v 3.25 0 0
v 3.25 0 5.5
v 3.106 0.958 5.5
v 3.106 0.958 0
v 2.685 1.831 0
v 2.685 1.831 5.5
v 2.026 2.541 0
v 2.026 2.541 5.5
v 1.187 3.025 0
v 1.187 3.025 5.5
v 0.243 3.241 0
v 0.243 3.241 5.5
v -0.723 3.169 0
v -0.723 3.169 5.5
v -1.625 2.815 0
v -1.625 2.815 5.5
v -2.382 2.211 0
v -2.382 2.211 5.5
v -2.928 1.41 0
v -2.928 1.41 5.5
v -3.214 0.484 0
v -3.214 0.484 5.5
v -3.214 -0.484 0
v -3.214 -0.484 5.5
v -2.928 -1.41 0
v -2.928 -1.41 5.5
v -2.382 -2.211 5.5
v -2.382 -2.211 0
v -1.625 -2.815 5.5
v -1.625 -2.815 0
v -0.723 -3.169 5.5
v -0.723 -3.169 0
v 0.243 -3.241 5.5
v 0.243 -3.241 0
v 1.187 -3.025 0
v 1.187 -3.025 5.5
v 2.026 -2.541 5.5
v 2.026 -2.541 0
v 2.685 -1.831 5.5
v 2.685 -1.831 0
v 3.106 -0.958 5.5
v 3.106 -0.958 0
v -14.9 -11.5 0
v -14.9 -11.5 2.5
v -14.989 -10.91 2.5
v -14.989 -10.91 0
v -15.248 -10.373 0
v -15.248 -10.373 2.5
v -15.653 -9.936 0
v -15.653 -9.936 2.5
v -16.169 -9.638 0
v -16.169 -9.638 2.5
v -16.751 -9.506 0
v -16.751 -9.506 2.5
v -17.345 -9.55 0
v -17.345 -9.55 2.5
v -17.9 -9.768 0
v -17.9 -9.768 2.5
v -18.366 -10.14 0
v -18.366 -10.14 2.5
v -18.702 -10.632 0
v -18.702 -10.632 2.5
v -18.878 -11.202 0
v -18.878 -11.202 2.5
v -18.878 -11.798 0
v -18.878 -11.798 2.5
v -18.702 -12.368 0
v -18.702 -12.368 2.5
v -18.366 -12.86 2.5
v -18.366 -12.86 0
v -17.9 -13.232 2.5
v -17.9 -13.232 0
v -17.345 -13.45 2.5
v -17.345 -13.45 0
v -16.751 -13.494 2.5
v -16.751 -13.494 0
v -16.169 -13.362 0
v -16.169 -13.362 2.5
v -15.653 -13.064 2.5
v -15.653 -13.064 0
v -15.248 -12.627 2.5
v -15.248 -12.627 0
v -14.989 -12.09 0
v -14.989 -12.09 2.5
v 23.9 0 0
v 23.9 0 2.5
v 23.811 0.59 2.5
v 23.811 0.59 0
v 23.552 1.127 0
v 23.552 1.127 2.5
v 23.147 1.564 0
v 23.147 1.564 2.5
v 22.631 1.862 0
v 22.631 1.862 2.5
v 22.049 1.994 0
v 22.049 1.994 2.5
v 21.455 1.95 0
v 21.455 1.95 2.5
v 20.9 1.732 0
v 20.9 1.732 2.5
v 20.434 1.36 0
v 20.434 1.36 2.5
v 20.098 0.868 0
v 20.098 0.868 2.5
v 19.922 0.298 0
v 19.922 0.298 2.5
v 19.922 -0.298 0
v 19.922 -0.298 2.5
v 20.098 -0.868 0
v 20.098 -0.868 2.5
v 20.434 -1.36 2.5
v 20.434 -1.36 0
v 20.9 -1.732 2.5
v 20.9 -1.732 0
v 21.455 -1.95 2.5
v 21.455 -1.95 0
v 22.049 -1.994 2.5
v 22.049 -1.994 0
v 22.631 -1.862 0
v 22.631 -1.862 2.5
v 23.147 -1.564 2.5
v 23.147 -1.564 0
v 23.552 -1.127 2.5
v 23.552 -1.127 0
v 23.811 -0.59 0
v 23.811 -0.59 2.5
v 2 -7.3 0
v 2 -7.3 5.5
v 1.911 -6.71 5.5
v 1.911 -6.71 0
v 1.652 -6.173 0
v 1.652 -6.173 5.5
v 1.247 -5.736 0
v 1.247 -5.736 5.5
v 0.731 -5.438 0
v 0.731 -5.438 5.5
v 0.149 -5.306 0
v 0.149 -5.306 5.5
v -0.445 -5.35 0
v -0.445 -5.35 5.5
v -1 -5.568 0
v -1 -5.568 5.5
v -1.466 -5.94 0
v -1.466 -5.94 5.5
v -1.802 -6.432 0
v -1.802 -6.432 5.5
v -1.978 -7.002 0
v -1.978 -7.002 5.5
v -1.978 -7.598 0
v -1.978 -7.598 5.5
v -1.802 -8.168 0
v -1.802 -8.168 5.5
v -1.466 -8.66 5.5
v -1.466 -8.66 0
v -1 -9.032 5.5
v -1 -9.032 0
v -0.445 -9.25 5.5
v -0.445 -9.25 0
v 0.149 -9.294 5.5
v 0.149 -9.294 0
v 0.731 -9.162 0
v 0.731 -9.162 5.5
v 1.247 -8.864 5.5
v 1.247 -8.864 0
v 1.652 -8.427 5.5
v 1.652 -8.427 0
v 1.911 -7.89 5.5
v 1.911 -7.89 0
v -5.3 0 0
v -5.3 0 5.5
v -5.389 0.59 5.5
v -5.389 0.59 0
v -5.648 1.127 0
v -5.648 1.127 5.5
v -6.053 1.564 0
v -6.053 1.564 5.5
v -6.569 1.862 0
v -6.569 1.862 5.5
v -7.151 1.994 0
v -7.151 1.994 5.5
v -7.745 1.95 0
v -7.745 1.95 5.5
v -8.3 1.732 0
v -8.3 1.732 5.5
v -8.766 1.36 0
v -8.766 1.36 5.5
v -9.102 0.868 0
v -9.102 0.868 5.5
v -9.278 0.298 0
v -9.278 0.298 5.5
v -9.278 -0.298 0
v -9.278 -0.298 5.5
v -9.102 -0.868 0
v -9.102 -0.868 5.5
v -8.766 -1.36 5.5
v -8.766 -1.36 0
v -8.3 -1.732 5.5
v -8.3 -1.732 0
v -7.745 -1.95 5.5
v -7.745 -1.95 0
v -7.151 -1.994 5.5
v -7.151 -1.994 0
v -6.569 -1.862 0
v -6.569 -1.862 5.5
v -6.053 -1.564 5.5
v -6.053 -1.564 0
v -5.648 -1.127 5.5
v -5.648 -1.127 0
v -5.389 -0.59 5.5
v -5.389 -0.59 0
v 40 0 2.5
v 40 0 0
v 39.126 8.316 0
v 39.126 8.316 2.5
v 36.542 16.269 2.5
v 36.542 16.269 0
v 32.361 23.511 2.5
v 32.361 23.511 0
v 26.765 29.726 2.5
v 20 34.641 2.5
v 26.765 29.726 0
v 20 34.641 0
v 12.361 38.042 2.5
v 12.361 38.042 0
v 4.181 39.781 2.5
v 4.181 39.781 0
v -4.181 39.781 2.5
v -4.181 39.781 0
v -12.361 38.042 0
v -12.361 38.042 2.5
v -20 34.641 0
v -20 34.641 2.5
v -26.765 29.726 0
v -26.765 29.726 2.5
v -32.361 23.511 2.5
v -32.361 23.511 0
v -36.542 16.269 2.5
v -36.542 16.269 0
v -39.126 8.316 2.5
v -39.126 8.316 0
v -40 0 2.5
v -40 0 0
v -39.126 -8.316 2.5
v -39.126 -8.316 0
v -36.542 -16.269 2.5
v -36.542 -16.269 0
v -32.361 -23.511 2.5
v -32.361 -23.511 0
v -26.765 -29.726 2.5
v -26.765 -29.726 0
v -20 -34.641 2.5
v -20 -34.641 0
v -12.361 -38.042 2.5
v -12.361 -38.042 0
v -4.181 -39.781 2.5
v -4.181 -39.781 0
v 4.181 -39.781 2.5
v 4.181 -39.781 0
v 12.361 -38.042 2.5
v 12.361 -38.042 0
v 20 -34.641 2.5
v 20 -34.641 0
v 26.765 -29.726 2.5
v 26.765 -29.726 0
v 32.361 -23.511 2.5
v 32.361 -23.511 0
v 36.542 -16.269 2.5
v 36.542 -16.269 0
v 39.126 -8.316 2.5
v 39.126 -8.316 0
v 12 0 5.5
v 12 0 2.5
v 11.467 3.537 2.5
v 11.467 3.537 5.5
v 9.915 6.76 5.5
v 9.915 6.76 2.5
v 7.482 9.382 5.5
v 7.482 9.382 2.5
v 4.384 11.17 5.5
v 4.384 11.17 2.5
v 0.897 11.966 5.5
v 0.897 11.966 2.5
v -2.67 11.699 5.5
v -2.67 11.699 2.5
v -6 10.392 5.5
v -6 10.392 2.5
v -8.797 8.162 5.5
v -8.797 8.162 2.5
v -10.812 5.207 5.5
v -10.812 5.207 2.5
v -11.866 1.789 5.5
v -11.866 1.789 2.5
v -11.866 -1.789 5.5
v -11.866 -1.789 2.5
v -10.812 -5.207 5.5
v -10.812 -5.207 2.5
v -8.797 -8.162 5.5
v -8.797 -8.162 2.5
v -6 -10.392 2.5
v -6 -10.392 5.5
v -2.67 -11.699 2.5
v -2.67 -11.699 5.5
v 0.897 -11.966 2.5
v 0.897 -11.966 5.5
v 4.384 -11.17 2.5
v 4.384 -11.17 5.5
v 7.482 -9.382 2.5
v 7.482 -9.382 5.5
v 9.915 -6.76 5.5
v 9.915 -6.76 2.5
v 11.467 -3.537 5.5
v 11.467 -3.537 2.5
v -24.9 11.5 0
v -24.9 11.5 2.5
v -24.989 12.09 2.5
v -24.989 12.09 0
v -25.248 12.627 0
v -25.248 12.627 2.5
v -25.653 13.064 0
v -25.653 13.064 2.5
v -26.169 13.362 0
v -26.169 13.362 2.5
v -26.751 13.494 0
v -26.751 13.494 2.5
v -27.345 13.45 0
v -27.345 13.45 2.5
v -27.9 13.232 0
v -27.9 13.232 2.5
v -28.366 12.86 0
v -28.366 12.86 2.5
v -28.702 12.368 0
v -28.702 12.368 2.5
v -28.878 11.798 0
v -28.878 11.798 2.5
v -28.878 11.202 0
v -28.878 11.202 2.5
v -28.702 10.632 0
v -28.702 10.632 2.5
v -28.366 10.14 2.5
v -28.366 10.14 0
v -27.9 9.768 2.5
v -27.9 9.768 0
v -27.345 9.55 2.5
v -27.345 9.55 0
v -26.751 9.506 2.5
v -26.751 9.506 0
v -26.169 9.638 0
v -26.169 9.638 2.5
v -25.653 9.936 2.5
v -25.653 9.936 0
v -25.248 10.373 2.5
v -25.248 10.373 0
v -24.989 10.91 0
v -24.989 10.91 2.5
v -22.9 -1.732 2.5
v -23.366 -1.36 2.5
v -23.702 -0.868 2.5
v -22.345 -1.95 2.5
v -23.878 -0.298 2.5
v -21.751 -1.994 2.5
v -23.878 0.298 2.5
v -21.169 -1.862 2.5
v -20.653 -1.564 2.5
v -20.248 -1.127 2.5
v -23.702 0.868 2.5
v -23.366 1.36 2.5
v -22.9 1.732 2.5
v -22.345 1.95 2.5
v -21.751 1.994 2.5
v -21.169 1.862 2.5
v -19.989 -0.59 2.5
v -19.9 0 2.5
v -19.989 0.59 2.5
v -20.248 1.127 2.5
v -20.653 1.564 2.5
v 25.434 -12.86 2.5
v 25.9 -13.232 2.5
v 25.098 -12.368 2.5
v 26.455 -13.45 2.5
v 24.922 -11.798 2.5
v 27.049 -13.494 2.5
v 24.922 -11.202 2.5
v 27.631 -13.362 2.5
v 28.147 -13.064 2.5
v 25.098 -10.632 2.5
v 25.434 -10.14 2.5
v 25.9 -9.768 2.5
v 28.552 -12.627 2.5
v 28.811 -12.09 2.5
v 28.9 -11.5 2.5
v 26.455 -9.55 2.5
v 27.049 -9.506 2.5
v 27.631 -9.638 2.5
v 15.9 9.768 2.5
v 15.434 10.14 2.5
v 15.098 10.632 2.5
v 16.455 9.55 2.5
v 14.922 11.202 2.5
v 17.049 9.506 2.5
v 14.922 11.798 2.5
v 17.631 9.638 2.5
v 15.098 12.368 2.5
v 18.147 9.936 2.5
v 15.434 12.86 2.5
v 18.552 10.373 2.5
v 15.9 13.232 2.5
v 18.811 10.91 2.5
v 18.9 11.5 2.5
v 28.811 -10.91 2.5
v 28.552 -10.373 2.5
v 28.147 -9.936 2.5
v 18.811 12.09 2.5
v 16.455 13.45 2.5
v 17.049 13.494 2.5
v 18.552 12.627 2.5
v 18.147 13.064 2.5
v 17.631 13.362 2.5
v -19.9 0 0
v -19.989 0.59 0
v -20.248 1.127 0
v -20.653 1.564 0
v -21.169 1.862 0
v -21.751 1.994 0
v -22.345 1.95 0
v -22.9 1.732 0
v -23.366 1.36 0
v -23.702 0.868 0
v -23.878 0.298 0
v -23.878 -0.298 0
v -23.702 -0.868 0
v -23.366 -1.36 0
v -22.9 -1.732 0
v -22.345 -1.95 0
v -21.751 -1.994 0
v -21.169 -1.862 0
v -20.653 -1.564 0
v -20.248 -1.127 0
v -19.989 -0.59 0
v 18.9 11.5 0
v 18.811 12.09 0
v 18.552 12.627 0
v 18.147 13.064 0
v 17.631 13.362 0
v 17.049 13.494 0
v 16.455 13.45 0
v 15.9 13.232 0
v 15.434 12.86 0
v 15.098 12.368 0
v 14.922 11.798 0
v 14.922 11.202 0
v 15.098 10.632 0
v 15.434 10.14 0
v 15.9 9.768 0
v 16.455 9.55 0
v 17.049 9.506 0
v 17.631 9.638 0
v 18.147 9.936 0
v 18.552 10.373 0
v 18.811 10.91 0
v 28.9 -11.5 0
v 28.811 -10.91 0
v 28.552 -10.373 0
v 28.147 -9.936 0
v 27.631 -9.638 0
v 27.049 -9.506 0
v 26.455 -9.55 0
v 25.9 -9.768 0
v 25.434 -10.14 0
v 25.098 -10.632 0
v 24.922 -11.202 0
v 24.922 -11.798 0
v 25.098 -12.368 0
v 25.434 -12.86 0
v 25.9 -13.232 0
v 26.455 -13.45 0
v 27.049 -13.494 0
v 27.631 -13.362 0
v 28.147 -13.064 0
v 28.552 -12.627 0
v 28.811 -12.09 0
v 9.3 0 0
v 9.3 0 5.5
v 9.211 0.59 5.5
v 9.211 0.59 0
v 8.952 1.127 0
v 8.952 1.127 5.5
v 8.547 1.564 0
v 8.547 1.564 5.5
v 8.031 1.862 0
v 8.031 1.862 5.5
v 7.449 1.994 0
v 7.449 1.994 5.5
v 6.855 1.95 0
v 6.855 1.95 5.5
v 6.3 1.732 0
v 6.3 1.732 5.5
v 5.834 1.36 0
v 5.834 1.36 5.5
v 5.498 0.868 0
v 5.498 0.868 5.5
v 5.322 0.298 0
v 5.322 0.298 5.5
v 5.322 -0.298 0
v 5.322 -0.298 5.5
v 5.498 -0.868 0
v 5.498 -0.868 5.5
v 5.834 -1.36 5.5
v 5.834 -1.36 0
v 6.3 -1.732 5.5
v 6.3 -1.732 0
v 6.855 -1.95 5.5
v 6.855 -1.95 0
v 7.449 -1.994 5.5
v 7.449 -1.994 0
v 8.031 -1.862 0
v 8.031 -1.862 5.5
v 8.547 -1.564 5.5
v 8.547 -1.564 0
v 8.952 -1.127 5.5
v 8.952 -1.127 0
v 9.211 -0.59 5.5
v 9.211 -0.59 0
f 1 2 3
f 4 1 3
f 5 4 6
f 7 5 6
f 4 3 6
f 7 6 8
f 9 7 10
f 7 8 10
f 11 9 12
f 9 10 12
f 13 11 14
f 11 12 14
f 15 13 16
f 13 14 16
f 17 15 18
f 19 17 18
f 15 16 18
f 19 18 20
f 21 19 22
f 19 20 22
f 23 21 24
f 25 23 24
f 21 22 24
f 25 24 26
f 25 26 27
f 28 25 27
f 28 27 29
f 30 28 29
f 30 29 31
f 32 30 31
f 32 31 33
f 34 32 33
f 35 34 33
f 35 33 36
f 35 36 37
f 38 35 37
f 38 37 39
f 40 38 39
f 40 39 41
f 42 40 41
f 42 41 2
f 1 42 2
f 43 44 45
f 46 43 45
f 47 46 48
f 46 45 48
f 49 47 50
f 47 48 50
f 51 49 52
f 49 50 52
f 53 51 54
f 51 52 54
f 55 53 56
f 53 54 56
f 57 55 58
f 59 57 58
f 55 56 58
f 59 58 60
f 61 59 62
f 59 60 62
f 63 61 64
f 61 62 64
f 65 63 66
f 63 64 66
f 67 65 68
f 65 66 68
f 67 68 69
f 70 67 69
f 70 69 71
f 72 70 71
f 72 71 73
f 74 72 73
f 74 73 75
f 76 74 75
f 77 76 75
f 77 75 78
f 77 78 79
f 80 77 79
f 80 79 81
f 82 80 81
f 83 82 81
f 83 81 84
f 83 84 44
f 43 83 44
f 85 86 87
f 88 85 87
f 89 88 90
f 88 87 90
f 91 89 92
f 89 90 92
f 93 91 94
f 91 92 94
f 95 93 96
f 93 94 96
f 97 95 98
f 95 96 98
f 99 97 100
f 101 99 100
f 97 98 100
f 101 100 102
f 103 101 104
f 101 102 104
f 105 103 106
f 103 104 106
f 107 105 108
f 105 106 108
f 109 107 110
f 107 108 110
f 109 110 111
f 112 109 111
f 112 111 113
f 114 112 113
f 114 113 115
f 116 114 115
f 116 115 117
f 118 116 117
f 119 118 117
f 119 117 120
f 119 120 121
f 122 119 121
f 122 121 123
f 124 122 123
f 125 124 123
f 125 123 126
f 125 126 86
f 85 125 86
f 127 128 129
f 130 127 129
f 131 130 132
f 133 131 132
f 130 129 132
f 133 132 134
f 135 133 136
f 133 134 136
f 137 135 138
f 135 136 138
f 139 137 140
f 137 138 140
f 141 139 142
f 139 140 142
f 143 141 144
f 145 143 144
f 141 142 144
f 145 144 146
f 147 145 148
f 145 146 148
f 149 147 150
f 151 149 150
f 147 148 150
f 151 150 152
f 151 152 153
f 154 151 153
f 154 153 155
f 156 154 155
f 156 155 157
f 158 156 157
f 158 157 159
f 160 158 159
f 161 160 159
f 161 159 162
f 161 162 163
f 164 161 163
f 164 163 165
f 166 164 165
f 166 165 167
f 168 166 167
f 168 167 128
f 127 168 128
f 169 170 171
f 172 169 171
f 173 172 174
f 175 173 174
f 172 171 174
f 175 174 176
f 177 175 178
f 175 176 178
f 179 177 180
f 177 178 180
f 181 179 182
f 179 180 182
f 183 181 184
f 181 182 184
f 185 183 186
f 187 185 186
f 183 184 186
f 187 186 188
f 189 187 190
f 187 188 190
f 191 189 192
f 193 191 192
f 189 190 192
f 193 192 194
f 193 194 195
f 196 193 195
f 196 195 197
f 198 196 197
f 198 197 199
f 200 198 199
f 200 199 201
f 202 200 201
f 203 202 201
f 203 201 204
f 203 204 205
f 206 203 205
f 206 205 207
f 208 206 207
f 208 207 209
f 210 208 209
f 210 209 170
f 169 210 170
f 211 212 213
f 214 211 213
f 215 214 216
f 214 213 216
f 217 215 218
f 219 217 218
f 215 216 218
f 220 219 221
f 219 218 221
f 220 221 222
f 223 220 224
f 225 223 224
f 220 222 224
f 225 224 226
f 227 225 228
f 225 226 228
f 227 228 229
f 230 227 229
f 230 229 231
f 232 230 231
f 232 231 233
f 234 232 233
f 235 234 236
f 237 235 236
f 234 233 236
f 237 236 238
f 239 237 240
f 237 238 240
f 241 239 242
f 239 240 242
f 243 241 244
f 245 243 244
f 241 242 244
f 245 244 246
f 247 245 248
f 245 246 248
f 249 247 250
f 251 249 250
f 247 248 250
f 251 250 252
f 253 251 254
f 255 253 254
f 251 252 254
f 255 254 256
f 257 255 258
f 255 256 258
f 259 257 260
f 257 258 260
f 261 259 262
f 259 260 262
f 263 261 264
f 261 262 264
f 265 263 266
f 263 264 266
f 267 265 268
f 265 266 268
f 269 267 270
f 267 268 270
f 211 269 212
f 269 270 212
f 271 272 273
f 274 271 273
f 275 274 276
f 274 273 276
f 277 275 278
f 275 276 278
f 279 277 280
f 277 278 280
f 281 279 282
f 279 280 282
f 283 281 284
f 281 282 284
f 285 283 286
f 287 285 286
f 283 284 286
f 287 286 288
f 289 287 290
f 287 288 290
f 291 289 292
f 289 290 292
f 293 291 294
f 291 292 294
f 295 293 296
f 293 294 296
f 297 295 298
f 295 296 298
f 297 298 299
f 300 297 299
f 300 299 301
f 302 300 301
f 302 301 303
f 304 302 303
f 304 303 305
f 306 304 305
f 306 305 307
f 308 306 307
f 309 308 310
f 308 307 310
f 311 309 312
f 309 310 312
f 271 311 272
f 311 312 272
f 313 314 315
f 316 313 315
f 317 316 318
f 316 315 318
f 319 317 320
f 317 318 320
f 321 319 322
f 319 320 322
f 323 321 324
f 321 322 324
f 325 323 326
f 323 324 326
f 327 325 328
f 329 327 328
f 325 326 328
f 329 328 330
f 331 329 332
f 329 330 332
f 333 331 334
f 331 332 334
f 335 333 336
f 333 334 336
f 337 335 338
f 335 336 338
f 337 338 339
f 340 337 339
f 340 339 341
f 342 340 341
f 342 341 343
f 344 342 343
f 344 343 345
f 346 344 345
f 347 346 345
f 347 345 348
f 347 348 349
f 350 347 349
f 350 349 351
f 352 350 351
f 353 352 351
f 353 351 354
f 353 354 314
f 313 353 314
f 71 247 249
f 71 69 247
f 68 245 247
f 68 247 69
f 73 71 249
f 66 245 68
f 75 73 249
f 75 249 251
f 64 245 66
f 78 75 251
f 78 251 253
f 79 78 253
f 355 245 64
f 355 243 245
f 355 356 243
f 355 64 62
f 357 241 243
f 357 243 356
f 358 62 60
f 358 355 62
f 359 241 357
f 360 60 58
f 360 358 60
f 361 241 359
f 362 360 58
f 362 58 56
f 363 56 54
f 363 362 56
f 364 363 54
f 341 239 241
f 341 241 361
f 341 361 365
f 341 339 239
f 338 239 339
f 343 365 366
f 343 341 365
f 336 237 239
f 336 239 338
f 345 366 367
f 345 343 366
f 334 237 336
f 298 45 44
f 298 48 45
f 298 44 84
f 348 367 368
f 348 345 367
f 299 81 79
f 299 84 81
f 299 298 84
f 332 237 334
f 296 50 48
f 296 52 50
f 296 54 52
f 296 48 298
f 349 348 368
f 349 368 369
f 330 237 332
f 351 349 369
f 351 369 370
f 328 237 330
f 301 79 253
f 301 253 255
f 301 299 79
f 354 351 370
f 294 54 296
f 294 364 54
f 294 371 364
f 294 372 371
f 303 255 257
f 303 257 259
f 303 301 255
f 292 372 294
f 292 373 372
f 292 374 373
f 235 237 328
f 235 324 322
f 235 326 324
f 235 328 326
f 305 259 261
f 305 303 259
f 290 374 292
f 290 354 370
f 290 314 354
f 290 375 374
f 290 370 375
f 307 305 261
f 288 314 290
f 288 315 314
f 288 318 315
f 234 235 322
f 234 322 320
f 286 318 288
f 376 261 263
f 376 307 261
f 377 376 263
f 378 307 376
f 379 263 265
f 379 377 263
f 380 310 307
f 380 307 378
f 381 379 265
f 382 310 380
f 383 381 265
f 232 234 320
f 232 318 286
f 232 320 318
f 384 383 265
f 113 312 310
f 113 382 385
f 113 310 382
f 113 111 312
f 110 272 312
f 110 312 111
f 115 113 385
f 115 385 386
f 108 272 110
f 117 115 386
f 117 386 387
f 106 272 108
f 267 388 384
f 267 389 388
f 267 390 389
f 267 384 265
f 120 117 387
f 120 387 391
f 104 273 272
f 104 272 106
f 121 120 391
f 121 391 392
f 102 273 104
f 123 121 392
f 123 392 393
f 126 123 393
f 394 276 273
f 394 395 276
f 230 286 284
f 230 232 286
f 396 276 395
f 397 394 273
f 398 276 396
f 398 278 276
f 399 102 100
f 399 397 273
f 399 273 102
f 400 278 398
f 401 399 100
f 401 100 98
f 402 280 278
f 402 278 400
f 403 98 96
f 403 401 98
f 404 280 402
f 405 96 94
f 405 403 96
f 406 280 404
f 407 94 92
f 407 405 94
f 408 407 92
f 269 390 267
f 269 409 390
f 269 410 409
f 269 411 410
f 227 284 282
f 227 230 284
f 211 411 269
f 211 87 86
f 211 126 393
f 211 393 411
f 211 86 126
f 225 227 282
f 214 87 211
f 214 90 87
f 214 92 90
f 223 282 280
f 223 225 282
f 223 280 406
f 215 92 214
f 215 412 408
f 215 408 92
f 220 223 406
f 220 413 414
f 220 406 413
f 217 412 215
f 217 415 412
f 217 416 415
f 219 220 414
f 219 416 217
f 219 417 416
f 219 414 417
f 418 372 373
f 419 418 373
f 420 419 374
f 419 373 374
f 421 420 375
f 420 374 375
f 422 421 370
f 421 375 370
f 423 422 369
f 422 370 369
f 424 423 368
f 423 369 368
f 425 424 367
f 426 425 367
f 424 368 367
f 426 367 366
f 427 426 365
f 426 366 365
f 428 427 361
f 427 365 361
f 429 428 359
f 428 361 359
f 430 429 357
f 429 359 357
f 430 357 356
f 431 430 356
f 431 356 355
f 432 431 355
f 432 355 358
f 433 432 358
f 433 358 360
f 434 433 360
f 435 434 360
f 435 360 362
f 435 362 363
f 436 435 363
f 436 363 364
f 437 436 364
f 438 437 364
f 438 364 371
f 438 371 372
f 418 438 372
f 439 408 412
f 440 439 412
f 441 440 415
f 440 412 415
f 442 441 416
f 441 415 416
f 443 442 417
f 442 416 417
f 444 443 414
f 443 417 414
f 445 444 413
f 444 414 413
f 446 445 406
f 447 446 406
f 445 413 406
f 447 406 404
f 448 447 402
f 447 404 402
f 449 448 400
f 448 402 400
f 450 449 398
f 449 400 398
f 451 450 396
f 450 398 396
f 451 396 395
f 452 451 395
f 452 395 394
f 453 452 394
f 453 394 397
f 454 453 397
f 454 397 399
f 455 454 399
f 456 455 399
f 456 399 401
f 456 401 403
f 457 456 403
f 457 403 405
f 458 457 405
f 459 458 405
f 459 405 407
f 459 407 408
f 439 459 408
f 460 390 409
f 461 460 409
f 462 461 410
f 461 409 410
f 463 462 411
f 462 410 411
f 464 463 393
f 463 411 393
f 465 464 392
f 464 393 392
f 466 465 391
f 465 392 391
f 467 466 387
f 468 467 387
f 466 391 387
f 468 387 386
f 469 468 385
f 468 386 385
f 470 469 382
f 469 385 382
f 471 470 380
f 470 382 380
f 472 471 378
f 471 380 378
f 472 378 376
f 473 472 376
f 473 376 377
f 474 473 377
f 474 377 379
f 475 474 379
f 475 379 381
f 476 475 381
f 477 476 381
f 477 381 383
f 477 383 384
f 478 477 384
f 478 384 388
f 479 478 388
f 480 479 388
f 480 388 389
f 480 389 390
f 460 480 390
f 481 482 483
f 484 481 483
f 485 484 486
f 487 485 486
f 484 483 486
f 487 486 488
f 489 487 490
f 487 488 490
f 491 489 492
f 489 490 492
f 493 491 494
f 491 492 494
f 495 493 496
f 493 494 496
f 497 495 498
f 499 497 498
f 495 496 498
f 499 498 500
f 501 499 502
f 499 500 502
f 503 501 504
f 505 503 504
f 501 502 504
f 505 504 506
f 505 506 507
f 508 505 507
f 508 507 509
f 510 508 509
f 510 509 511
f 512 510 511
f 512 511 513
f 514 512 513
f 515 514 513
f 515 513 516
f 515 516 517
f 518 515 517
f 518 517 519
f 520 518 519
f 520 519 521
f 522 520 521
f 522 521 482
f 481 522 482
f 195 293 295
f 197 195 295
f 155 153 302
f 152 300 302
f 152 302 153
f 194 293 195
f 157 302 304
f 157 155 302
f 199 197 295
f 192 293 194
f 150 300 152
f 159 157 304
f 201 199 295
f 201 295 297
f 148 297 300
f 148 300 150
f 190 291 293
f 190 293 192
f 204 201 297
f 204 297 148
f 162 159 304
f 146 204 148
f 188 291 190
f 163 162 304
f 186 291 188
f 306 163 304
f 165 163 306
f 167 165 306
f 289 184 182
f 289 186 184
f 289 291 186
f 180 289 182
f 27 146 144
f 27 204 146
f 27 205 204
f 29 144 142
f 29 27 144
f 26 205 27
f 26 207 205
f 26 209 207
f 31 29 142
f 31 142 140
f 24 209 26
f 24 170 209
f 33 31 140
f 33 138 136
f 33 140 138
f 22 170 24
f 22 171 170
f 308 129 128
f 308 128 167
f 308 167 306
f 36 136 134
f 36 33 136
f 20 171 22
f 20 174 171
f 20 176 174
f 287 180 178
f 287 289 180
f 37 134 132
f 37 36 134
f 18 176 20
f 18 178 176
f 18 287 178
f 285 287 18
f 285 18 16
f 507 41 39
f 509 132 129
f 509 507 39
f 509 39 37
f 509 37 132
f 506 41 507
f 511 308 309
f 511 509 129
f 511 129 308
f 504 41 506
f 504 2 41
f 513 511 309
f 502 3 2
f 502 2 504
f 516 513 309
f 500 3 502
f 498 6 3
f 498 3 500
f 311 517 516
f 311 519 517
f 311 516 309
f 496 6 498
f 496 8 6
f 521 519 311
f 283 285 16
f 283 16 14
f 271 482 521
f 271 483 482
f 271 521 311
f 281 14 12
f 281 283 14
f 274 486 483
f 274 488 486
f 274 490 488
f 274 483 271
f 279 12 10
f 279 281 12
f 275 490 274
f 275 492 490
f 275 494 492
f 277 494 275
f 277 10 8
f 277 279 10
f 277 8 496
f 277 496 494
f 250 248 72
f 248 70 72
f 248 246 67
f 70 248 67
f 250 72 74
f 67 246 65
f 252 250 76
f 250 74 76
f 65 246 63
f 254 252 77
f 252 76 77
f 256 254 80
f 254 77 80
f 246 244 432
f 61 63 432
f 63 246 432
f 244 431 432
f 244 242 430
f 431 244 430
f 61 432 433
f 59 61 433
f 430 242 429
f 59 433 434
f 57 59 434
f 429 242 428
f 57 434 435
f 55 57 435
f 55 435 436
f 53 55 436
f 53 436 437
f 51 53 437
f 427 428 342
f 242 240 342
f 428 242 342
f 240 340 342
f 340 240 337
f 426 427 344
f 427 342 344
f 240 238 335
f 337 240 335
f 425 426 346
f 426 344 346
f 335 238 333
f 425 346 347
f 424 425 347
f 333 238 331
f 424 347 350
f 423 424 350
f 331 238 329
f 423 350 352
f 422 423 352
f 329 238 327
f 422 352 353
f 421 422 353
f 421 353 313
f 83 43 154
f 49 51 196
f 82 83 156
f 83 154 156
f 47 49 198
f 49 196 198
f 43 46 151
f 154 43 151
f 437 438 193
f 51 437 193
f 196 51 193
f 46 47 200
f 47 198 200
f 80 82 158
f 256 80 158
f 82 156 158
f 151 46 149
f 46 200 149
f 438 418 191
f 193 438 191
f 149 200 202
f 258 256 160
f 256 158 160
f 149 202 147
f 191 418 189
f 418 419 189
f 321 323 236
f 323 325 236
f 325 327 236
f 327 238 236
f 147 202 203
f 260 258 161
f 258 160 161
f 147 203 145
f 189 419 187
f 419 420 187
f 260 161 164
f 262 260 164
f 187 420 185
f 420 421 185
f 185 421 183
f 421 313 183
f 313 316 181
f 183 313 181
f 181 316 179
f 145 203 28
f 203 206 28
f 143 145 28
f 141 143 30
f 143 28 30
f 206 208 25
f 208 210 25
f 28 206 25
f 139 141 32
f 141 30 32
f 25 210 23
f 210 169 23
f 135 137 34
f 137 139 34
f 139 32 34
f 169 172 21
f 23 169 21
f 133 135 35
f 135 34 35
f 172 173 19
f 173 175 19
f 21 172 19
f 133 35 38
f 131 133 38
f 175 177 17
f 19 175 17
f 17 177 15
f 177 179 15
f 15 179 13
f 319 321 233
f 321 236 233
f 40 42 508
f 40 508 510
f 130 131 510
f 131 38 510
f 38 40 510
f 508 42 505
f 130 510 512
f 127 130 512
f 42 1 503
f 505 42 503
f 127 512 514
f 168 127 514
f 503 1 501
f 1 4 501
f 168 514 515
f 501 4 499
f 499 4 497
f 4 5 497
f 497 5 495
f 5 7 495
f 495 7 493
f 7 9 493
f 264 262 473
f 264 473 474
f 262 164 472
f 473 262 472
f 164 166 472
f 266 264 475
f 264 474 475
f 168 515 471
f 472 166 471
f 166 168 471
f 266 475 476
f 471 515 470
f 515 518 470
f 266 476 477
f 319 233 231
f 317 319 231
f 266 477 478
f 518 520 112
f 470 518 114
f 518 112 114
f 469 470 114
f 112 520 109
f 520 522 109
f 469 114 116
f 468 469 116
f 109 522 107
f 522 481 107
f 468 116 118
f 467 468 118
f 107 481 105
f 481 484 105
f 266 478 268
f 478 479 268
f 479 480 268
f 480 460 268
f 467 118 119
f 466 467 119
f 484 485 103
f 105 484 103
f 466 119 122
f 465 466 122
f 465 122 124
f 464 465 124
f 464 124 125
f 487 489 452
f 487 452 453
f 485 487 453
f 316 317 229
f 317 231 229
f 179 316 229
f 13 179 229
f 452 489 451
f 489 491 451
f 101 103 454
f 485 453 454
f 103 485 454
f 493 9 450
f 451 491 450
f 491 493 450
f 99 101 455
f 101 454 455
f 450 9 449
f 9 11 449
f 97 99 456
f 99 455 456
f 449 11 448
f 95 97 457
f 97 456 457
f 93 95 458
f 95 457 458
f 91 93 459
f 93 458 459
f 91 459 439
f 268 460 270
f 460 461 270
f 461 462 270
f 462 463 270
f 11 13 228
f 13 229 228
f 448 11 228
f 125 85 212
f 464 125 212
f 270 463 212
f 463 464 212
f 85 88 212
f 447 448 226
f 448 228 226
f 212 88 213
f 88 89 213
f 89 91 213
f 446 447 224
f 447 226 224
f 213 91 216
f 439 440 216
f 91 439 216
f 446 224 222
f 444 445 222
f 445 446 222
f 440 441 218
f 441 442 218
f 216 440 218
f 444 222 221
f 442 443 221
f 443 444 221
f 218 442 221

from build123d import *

# Parameters (mm, degrees)
F0_R      = 40
F1_DEPTH  = 2.5
F2_R      = 12
F3_DEPTH  = 3
F4_R      = 2
F5_DEPTH  = 25
F6_R      = 3.25
F7_DEPTH  = 25
F9_R      = 2
F10_DEPTH = 25


with BuildPart() as f1:
    # F0 (on Top) → F1 (new body)
    with BuildSketch(Plane.XY):
        Circle(F0_R)
    extrude(amount=F1_DEPTH)

    # F2 (on face) → F3 (join)
    with BuildSketch(Plane.XY.offset(2.5)):
        Circle(F2_R)
    extrude(amount=F3_DEPTH)

    # F4 (on face) → F5 (cut)
    with BuildSketch(Plane.XY.offset(5.5)):
        with Locations((-7.3, 0)):
            Circle(F4_R)
        with Locations((7.3, 0)):
            Circle(F4_R)
        with Locations((0, -7.3)):
            Circle(F4_R)
    extrude(amount=-F5_DEPTH, mode=Mode.SUBTRACT)

    # F6 (on face) → F7 (cut)
    with BuildSketch(Plane.XY.offset(5.5)):
        Circle(F6_R)
    extrude(amount=-F7_DEPTH, mode=Mode.SUBTRACT)

    # F9 (on face) → F10 (cut)
    with BuildSketch(Plane.XY.offset(2.5)):
        with Locations((21.9, 0)):
            Circle(F9_R)
        with Locations((16.9, 11.5)):
            Circle(F9_R)
        with Locations((26.9, -11.5)):
            Circle(F9_R)
        with Locations((-26.9, 11.5)):
            Circle(F9_R)
        with Locations((-21.9, 0)):
            Circle(F9_R)
        with Locations((-16.9, -11.5)):
            Circle(F9_R)
    extrude(amount=-F10_DEPTH, mode=Mode.SUBTRACT)


solid = f1.part
